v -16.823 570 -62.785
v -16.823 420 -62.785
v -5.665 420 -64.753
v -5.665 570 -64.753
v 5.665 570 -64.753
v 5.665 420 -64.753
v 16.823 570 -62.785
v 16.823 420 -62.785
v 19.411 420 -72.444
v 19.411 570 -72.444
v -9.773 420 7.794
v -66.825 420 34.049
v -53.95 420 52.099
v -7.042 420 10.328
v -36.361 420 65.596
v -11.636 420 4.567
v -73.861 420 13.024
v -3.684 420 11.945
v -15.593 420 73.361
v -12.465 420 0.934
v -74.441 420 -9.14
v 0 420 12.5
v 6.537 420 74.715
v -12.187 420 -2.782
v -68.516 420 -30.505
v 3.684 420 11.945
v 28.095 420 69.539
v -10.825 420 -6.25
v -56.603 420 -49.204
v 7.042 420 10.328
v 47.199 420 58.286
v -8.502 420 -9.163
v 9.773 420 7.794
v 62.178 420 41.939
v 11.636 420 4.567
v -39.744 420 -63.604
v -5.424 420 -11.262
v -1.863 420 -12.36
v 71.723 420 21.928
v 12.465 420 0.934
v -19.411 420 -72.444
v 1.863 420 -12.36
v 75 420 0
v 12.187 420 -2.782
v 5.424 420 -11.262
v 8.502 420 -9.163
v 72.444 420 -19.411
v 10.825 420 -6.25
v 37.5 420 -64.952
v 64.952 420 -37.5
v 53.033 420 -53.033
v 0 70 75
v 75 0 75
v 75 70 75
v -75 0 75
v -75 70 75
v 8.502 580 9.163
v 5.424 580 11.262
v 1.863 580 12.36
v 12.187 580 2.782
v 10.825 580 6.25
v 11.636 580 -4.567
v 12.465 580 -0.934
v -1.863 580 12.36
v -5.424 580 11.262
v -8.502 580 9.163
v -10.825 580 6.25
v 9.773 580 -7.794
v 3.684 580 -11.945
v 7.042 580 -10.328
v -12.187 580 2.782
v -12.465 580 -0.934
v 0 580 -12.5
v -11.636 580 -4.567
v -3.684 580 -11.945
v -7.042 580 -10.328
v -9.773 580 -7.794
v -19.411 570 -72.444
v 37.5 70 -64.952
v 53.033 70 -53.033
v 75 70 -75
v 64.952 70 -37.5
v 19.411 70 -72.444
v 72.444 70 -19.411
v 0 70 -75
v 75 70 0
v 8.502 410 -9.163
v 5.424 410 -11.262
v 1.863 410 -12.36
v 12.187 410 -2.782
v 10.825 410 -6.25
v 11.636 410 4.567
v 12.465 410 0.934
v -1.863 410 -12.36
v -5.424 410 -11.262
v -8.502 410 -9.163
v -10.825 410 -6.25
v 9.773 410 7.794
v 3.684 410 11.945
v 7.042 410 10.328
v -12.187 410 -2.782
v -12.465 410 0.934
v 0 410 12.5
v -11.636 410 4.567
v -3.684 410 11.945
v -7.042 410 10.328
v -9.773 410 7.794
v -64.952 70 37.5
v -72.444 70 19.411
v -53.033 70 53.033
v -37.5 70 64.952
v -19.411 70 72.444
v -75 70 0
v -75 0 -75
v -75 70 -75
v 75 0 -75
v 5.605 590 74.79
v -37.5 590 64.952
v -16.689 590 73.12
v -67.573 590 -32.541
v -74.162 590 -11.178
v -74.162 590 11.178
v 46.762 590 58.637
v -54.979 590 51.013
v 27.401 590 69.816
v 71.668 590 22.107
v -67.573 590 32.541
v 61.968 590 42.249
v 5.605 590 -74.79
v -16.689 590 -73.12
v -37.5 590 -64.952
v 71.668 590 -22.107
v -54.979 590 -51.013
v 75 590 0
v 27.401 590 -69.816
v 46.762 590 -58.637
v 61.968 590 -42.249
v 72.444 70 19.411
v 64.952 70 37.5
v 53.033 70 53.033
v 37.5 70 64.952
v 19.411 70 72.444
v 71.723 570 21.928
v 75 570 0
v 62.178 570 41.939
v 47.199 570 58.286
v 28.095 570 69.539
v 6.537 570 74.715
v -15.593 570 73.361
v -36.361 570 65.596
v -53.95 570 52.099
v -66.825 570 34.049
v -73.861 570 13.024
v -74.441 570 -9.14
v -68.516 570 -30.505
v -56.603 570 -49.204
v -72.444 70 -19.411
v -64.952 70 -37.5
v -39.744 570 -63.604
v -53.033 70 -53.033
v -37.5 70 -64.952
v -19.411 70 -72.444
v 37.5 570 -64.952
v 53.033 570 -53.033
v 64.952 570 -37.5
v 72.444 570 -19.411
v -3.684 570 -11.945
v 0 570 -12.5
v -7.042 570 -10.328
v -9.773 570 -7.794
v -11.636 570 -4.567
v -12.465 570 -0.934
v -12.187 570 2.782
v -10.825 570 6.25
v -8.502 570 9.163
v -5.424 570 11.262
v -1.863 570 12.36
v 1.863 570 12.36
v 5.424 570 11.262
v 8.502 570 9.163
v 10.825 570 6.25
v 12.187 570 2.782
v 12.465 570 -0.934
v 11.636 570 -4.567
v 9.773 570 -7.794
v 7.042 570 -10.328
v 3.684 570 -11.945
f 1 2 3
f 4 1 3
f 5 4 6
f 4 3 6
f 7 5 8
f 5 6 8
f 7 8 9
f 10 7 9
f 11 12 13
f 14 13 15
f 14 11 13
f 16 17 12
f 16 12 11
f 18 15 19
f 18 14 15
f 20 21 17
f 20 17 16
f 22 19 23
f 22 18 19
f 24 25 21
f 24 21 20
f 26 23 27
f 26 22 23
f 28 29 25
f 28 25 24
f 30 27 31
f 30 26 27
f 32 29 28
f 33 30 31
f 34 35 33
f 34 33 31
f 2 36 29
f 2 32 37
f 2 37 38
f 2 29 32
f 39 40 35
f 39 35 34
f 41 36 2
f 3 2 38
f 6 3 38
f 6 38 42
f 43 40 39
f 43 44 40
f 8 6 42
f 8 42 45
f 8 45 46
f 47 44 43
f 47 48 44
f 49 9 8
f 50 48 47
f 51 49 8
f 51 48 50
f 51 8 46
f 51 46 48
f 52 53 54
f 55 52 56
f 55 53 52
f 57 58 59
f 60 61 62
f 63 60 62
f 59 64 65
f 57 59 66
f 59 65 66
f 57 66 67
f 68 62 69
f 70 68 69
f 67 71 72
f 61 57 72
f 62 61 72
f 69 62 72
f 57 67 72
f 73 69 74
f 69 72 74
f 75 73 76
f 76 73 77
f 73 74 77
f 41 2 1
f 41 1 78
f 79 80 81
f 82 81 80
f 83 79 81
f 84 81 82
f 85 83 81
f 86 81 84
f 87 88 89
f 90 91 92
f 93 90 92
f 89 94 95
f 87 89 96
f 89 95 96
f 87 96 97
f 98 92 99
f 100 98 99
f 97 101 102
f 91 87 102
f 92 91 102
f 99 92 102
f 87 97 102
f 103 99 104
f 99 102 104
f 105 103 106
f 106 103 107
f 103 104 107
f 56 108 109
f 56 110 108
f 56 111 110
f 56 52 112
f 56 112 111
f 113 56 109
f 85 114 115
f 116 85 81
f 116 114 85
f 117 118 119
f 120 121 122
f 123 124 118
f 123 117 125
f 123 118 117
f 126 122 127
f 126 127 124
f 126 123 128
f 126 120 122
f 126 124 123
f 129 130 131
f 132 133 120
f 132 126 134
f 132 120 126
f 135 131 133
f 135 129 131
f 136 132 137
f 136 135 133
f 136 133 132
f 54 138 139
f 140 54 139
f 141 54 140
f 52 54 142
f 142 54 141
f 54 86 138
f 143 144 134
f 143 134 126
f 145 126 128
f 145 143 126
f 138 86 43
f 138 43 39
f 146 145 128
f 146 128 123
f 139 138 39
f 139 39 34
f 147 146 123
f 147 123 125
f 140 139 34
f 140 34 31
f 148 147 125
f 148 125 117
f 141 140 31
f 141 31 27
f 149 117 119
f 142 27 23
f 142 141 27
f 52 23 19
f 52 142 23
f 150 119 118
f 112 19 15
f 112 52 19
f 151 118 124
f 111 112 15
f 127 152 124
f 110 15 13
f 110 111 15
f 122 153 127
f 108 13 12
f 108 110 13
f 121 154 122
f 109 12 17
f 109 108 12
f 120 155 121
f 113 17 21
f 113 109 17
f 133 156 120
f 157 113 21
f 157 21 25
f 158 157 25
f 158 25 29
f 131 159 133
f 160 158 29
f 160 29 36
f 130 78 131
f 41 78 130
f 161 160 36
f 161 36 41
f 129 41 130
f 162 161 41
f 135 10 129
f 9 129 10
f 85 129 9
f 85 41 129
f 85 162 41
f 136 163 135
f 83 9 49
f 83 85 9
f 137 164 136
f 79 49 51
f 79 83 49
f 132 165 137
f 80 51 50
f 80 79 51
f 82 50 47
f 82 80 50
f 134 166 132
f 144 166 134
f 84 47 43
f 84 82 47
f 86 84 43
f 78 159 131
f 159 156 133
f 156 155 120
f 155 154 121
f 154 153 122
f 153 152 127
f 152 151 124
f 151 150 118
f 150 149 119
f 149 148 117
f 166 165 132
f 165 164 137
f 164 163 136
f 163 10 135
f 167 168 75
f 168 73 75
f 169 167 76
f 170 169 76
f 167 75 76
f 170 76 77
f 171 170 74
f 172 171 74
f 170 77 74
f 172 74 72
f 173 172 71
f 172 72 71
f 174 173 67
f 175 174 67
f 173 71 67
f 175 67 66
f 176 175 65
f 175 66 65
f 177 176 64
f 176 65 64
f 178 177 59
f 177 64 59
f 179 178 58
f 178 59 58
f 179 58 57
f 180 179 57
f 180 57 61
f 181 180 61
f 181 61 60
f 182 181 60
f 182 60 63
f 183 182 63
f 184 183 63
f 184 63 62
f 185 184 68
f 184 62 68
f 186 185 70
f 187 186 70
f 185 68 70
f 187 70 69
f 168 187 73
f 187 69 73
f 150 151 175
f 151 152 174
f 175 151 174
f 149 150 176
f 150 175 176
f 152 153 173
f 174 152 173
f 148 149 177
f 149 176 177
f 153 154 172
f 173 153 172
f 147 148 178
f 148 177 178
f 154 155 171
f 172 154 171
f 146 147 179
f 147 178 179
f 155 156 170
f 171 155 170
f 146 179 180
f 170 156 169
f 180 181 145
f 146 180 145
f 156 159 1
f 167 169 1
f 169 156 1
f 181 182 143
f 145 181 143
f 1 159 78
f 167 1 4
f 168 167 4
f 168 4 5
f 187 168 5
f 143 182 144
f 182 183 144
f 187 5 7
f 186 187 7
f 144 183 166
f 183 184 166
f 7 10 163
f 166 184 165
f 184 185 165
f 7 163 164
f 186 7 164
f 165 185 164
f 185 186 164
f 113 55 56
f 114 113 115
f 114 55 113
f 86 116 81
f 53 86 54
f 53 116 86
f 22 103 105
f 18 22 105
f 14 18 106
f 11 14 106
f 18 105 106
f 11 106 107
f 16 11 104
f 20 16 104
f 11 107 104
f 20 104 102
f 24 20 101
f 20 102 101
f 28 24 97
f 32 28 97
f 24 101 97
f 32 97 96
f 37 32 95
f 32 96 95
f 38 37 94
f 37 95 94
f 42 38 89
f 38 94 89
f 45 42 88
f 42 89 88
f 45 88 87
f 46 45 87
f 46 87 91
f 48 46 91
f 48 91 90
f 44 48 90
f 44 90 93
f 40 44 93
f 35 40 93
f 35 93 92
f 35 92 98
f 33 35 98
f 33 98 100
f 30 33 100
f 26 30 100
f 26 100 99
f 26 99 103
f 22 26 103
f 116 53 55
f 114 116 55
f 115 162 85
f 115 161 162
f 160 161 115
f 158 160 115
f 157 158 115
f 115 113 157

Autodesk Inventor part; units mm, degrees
ref_plane "YZ Plane" through (0, 0, 0) normal (1, 0, 0) x (0, 1, 0)
ref_plane "XZ Plane" through (0, 0, 0) normal (0, 1, 0) x (-1, 0, 0)
ref_plane "XY Plane" through (0, 0, 0) normal (0, 0, 1) x (1, 0, 0)
sketch "Szkic1" plane through (0, 0, 0) normal (0, 1, 0) x (-1, 0, 0)
  line L0 (-75, 75) -> (75, 75)
  line L1 (75, 75) -> (75, -75)
  line L2 (75, -75) -> (-75, -75)
  line L3 (-75, -75) -> (-75, 75)
  line L4 (-75, 75) -> (75, -75) construction
  line L5 (75, 75) -> (-75, -75) construction
  point P0 (0, 0)
  dimension "d0" = 150
  dimension "d1" = 150
extrude "Wyciągnięcie proste1" add sketch "Szkic1" along normal blind 70
sketch "Szkic2" plane through (0, 70, 0) normal (0, 1, 0) x (1, 0, 0)
  line L0 (-75, 75) -> (-75, -75) projected
  line L1 (75, 75) -> (-75, 75) projected
  line L2 (75, -75) -> (75, 75) projected
  line L3 (75, 75) -> (-75, 75) projected
  line L4 (-75, 75) -> (-75, -75) projected
  line L5 (-75, -75) -> (75, -75) projected
  line L6 (75, -75) -> (75, 75) projected
  circle A0 centre (0, 0) radius 75
  dimension "d4" = 150
extrude "Wyciągnięcie proste2" add sketch "Szkic2" along normal blind 350 contours A0
sketch "Szkic3" plane through (0, 420, 0) normal (0, 1, 0) x (1, 0, 0)
  circle A0 centre (0, 0) radius 75 projected
  circle A1 centre (0, 0) radius 65
  line L0 (0, 0) -> (-19.4114, 72.4444)
  line L1 (0, 0) -> (19.4114, 72.4444)
  arc A2 (75, 0) -> (0, 75) centre (0, 0) ccw projected
  line L2 (0, 0) -> (0, 75)
  line L3 (75, 75) -> (-75, 75) projected
  point P0 (-16.8232, 62.7852)
  point P1 (16.8232, 62.7852)
  dimension "d7" = 130
  dimension "d8" = 15
  dimension "d9" = 15
extrude "Wyciągnięcie proste3" add sketch "Szkic3" along normal blind 150 contours L1 A1 L2 A0 | A0 L2 A1 L0
sketch "Szkic4" plane through (0, 570, 0) normal (0, 1, 0) x (1, 0, 0)
  circle A0 centre (0, 0) radius 75
  dimension "d12" = 150
extrude "Wyciągnięcie proste4" add sketch "Szkic4" along normal blind 20
sketch "Szkic5" plane through (0, 420, 0) normal (0, 1, 0) x (1, 0, 0)
  circle A0 centre (0, 0) radius 12.5
  dimension "d15" = 25
sketch "Szkic6" plane through (0, 570, 0) normal (0, -1, 0) x (1, 0, 0)
  circle A0 centre (0, 0) radius 12.5
  dimension "d18" = 25
hole "Otwór1" at (0, 420, 0) direction (0, -1, 0) diameter 25 depth 10
hole "Otwór2" at (0, 570, 0) direction (0, 1, 0) diameter 25 depth 10
equation "\"PromieńGięcia\" = Grubość"
equation "\"SzerokośćGięciaPodcięcia\" = Grubość"
equation "\"GłębokośćGięciaPodcięcia\" = 0.5 * Grubość"
equation "\"RozmiarPodcięciaNarożnika\" = 4 * Grubość"
equation "\"MinimalnaPozostałość\" = 2 * Grubość"
equation "\"PromieńPrzejścia\" = PromieńGięcia"
equation "\"Rozmiar_promienia_Jacobiego\" = PromieńGięcia"
equation "\"Wielk_odstępu\" = Grubość"
equation "\"Grubość\" = 0.5"
properties part number "1przegub"
